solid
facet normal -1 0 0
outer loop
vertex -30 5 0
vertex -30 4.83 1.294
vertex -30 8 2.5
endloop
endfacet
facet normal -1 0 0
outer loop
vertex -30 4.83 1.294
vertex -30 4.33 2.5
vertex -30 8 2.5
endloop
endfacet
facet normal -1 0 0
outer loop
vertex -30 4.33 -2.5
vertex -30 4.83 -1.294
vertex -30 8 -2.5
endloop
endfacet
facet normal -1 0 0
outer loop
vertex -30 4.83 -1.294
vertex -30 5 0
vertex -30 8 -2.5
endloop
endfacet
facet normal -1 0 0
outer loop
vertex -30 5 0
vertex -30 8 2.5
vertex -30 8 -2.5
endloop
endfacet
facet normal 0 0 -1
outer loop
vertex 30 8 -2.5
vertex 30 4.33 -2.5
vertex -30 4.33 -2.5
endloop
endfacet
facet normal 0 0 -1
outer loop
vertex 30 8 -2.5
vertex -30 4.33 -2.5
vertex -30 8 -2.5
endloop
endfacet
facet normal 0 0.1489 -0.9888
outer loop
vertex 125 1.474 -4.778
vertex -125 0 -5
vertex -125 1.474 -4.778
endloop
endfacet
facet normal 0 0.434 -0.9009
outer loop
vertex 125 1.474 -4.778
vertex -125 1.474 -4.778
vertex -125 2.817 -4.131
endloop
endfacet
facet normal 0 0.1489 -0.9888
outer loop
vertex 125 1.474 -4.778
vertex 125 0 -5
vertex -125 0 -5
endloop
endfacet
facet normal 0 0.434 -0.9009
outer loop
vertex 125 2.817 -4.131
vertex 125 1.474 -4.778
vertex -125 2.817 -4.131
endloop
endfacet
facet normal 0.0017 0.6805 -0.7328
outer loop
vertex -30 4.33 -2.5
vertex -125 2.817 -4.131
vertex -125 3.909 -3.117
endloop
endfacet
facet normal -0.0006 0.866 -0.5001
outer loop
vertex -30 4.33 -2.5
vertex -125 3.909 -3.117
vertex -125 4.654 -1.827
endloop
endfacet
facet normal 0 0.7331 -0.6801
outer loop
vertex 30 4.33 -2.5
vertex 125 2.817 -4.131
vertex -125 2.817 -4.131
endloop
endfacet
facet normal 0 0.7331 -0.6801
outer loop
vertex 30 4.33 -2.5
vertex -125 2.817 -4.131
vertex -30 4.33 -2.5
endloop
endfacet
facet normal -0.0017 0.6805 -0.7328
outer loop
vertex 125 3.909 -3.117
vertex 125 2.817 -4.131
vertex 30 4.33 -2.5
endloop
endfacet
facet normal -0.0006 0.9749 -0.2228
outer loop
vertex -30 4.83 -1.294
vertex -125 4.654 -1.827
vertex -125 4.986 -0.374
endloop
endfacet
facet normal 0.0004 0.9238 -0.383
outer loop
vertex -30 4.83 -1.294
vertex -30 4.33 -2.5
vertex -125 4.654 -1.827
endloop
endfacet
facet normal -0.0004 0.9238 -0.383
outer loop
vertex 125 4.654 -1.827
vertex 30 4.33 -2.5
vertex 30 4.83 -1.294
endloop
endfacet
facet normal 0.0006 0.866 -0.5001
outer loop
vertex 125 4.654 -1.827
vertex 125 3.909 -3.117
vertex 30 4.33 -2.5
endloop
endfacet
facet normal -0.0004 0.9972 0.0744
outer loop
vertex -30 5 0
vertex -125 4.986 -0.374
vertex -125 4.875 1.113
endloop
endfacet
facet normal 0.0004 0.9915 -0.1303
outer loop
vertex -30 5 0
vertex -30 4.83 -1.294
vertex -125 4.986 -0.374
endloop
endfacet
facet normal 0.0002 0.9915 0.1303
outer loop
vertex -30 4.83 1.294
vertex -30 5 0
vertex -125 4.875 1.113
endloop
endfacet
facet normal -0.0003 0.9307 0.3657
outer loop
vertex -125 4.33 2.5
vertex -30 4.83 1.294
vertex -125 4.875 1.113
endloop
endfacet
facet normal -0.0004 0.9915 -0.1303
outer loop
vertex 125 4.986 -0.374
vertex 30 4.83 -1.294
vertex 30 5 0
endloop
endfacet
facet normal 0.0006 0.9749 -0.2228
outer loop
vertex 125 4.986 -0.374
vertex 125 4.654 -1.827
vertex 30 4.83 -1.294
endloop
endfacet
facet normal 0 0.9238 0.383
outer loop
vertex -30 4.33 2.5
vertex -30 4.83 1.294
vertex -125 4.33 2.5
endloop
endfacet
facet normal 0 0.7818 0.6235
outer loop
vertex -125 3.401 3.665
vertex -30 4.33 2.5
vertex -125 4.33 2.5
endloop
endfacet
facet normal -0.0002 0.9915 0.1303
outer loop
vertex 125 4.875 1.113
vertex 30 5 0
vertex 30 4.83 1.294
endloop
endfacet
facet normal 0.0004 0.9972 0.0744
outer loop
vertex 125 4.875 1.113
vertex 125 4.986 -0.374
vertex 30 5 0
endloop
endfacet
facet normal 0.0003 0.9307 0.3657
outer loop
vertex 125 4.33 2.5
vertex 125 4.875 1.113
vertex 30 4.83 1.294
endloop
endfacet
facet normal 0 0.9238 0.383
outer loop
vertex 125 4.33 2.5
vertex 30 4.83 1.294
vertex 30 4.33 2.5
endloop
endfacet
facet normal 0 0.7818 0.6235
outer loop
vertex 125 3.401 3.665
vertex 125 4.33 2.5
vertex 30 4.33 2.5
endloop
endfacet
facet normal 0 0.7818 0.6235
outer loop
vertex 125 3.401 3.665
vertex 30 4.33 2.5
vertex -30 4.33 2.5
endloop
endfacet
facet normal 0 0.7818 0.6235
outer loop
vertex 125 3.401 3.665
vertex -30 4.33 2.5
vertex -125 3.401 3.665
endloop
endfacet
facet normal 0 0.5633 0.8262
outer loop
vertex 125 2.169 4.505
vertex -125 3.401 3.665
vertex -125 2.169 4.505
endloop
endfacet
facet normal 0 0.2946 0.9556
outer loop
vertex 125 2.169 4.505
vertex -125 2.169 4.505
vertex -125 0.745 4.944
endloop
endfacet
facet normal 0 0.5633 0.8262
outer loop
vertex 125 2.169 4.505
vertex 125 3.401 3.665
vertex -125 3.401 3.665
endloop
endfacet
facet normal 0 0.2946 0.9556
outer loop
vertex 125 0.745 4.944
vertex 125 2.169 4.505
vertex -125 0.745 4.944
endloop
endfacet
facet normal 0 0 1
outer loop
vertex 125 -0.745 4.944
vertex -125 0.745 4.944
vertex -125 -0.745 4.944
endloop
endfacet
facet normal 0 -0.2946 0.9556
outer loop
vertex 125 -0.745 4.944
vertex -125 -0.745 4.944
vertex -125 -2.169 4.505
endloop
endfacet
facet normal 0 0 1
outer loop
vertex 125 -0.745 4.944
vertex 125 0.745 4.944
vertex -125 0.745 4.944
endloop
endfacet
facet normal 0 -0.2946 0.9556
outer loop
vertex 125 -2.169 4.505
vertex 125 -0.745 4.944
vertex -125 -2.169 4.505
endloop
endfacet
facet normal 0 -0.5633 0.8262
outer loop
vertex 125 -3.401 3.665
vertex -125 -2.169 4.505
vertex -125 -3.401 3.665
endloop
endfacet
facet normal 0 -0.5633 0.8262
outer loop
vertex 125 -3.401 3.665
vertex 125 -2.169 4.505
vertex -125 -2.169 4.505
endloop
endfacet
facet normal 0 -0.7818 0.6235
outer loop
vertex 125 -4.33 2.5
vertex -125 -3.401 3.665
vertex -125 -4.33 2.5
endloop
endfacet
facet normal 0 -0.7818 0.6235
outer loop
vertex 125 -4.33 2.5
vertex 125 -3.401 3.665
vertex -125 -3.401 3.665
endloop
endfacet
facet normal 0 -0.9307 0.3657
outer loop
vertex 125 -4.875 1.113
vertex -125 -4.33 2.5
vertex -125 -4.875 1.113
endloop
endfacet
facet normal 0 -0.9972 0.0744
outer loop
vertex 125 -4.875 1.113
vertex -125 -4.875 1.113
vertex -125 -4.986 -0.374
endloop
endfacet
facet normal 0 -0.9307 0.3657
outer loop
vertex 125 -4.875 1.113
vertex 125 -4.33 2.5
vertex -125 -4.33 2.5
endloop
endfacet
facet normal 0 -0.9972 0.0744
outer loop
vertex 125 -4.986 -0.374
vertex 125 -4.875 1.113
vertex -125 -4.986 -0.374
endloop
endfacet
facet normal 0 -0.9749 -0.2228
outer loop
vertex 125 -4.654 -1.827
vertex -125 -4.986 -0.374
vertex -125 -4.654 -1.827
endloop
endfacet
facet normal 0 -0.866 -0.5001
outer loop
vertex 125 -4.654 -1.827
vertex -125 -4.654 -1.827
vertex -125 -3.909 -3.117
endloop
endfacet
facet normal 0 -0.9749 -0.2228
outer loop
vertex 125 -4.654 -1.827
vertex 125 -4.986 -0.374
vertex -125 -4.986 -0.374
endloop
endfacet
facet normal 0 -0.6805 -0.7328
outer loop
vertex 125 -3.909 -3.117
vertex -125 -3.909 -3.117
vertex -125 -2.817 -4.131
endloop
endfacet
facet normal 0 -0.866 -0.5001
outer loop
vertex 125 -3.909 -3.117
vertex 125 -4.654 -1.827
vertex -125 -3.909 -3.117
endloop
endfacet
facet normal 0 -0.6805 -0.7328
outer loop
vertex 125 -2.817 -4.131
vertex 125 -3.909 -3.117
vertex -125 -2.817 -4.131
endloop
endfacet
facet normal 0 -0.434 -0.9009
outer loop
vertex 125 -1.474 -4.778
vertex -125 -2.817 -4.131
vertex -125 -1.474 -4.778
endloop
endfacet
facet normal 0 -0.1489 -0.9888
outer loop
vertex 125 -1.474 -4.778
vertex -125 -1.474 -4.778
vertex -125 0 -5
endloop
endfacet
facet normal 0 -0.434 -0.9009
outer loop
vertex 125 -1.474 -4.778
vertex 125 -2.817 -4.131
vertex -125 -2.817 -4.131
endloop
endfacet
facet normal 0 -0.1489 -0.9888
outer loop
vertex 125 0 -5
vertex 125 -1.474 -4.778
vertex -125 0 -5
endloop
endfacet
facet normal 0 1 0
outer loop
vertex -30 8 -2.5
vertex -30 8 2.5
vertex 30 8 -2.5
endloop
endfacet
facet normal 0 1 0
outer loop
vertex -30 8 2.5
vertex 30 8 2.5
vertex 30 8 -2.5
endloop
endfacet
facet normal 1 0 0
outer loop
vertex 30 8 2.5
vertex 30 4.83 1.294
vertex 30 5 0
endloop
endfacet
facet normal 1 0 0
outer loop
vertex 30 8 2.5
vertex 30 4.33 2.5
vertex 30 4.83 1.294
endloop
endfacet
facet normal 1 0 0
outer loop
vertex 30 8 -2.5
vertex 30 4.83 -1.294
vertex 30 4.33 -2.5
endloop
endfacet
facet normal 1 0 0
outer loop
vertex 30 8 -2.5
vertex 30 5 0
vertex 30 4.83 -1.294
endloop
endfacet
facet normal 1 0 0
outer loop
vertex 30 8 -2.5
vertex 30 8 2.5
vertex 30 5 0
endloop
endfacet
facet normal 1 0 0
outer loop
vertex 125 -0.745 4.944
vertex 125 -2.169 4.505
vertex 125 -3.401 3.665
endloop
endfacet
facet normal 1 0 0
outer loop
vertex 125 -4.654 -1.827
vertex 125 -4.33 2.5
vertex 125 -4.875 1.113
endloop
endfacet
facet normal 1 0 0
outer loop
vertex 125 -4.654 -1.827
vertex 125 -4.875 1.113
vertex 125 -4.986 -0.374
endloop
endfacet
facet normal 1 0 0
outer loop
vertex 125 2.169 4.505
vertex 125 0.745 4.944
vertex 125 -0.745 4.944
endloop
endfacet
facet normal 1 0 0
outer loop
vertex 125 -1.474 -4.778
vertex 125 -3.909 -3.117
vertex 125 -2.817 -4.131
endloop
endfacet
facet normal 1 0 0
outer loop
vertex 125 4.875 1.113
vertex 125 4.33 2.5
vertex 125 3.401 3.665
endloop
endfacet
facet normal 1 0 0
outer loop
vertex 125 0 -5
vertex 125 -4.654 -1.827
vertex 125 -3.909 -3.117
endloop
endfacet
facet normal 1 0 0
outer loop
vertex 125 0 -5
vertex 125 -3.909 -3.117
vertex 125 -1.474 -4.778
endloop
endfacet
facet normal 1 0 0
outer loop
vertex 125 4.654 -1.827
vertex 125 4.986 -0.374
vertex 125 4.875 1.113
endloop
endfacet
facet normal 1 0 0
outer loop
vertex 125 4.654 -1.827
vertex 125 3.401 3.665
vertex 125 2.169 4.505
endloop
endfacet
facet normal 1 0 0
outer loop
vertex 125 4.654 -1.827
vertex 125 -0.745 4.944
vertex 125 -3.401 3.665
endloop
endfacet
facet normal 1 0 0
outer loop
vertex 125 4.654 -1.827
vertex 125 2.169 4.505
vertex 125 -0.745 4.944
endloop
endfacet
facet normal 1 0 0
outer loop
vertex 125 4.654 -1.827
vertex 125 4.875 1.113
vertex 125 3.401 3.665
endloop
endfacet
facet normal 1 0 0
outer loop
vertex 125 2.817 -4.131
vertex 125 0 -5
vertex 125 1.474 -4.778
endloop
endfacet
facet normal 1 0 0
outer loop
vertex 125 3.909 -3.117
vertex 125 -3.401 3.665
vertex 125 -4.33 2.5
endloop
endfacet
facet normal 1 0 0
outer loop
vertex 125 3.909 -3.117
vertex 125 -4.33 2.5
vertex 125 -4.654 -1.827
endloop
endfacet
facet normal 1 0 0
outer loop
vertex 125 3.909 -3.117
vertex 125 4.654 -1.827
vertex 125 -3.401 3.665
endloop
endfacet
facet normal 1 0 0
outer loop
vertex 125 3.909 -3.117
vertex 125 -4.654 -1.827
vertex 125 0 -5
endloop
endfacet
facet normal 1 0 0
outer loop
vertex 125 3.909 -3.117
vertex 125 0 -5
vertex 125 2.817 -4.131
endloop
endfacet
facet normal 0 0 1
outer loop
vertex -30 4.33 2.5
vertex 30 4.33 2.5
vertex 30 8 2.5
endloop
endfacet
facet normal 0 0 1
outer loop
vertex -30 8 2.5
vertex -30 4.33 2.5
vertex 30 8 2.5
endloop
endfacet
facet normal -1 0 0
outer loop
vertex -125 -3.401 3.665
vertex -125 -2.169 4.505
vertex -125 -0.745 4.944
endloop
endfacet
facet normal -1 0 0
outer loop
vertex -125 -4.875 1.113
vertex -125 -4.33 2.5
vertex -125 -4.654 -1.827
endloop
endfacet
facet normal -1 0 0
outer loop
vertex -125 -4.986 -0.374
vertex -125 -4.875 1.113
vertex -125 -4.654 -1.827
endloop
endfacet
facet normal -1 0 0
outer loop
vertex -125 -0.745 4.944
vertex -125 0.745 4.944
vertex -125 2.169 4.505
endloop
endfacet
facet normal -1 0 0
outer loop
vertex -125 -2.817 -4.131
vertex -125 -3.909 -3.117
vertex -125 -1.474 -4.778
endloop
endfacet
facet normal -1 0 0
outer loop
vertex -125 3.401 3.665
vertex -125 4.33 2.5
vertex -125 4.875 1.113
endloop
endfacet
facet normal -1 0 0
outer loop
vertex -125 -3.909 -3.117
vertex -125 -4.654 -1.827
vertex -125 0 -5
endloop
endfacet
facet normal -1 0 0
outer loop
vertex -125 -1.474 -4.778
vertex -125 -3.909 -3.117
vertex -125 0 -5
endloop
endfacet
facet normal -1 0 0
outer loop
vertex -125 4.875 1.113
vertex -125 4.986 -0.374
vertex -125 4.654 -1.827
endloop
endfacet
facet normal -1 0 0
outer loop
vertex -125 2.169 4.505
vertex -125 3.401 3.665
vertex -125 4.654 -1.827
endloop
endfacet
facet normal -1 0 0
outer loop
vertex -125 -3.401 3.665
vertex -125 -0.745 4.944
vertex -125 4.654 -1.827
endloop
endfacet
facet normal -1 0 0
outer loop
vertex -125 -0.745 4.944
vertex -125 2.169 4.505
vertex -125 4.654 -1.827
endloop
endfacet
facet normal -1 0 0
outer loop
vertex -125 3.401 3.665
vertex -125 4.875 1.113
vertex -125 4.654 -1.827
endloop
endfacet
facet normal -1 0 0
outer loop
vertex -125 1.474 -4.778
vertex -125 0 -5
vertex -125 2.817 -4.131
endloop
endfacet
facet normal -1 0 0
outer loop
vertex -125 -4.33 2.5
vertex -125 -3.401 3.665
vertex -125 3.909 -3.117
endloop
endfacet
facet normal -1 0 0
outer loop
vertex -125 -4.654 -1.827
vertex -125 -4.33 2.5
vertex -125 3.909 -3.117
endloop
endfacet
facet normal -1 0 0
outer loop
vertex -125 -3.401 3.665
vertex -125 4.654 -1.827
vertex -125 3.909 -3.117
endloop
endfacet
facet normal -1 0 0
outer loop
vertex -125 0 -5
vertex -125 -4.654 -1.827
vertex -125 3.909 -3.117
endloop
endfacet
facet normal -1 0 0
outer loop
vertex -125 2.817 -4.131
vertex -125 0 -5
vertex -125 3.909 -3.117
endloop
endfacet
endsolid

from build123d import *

# Parameters (mm, degrees)
SKETCH2_R                       = 5
SHAFT_DEPTH                     = 125
SHAFT_DEPTH_BACK                = 125
SKETCH3_W                       = 5
SKETCH3_H                       = 8
SHAFT_KEY_FOR_BICEPS_DEPTH      = 30
SHAFT_KEY_FOR_BICEPS_DEPTH_BACK = 30


with BuildPart() as part:
    # Sketch2 → Shaft (new body, two sides)
    with BuildSketch(Plane(origin=(0, 0, 0), x_dir=(0, 0, -1), z_dir=(1, 0, 0))) as shaft_sk:
        Circle(SKETCH2_R)
    extrude(amount=SHAFT_DEPTH)
    extrude(shaft_sk.sketch, amount=-SHAFT_DEPTH_BACK)

    # Sketch3 → Shaft Key for Biceps (add, two sides)
    with BuildSketch(Plane(origin=(0, 0, 0), x_dir=(0, 0, -1), z_dir=(1, 0, 0))) as shaft_key_for_biceps_sk:
        with Locations((0, 4)):
            Rectangle(SKETCH3_W, SKETCH3_H)
    extrude(amount=SHAFT_KEY_FOR_BICEPS_DEPTH)
    extrude(shaft_key_for_biceps_sk.sketch, amount=-SHAFT_KEY_FOR_BICEPS_DEPTH_BACK)


solid = part.part
